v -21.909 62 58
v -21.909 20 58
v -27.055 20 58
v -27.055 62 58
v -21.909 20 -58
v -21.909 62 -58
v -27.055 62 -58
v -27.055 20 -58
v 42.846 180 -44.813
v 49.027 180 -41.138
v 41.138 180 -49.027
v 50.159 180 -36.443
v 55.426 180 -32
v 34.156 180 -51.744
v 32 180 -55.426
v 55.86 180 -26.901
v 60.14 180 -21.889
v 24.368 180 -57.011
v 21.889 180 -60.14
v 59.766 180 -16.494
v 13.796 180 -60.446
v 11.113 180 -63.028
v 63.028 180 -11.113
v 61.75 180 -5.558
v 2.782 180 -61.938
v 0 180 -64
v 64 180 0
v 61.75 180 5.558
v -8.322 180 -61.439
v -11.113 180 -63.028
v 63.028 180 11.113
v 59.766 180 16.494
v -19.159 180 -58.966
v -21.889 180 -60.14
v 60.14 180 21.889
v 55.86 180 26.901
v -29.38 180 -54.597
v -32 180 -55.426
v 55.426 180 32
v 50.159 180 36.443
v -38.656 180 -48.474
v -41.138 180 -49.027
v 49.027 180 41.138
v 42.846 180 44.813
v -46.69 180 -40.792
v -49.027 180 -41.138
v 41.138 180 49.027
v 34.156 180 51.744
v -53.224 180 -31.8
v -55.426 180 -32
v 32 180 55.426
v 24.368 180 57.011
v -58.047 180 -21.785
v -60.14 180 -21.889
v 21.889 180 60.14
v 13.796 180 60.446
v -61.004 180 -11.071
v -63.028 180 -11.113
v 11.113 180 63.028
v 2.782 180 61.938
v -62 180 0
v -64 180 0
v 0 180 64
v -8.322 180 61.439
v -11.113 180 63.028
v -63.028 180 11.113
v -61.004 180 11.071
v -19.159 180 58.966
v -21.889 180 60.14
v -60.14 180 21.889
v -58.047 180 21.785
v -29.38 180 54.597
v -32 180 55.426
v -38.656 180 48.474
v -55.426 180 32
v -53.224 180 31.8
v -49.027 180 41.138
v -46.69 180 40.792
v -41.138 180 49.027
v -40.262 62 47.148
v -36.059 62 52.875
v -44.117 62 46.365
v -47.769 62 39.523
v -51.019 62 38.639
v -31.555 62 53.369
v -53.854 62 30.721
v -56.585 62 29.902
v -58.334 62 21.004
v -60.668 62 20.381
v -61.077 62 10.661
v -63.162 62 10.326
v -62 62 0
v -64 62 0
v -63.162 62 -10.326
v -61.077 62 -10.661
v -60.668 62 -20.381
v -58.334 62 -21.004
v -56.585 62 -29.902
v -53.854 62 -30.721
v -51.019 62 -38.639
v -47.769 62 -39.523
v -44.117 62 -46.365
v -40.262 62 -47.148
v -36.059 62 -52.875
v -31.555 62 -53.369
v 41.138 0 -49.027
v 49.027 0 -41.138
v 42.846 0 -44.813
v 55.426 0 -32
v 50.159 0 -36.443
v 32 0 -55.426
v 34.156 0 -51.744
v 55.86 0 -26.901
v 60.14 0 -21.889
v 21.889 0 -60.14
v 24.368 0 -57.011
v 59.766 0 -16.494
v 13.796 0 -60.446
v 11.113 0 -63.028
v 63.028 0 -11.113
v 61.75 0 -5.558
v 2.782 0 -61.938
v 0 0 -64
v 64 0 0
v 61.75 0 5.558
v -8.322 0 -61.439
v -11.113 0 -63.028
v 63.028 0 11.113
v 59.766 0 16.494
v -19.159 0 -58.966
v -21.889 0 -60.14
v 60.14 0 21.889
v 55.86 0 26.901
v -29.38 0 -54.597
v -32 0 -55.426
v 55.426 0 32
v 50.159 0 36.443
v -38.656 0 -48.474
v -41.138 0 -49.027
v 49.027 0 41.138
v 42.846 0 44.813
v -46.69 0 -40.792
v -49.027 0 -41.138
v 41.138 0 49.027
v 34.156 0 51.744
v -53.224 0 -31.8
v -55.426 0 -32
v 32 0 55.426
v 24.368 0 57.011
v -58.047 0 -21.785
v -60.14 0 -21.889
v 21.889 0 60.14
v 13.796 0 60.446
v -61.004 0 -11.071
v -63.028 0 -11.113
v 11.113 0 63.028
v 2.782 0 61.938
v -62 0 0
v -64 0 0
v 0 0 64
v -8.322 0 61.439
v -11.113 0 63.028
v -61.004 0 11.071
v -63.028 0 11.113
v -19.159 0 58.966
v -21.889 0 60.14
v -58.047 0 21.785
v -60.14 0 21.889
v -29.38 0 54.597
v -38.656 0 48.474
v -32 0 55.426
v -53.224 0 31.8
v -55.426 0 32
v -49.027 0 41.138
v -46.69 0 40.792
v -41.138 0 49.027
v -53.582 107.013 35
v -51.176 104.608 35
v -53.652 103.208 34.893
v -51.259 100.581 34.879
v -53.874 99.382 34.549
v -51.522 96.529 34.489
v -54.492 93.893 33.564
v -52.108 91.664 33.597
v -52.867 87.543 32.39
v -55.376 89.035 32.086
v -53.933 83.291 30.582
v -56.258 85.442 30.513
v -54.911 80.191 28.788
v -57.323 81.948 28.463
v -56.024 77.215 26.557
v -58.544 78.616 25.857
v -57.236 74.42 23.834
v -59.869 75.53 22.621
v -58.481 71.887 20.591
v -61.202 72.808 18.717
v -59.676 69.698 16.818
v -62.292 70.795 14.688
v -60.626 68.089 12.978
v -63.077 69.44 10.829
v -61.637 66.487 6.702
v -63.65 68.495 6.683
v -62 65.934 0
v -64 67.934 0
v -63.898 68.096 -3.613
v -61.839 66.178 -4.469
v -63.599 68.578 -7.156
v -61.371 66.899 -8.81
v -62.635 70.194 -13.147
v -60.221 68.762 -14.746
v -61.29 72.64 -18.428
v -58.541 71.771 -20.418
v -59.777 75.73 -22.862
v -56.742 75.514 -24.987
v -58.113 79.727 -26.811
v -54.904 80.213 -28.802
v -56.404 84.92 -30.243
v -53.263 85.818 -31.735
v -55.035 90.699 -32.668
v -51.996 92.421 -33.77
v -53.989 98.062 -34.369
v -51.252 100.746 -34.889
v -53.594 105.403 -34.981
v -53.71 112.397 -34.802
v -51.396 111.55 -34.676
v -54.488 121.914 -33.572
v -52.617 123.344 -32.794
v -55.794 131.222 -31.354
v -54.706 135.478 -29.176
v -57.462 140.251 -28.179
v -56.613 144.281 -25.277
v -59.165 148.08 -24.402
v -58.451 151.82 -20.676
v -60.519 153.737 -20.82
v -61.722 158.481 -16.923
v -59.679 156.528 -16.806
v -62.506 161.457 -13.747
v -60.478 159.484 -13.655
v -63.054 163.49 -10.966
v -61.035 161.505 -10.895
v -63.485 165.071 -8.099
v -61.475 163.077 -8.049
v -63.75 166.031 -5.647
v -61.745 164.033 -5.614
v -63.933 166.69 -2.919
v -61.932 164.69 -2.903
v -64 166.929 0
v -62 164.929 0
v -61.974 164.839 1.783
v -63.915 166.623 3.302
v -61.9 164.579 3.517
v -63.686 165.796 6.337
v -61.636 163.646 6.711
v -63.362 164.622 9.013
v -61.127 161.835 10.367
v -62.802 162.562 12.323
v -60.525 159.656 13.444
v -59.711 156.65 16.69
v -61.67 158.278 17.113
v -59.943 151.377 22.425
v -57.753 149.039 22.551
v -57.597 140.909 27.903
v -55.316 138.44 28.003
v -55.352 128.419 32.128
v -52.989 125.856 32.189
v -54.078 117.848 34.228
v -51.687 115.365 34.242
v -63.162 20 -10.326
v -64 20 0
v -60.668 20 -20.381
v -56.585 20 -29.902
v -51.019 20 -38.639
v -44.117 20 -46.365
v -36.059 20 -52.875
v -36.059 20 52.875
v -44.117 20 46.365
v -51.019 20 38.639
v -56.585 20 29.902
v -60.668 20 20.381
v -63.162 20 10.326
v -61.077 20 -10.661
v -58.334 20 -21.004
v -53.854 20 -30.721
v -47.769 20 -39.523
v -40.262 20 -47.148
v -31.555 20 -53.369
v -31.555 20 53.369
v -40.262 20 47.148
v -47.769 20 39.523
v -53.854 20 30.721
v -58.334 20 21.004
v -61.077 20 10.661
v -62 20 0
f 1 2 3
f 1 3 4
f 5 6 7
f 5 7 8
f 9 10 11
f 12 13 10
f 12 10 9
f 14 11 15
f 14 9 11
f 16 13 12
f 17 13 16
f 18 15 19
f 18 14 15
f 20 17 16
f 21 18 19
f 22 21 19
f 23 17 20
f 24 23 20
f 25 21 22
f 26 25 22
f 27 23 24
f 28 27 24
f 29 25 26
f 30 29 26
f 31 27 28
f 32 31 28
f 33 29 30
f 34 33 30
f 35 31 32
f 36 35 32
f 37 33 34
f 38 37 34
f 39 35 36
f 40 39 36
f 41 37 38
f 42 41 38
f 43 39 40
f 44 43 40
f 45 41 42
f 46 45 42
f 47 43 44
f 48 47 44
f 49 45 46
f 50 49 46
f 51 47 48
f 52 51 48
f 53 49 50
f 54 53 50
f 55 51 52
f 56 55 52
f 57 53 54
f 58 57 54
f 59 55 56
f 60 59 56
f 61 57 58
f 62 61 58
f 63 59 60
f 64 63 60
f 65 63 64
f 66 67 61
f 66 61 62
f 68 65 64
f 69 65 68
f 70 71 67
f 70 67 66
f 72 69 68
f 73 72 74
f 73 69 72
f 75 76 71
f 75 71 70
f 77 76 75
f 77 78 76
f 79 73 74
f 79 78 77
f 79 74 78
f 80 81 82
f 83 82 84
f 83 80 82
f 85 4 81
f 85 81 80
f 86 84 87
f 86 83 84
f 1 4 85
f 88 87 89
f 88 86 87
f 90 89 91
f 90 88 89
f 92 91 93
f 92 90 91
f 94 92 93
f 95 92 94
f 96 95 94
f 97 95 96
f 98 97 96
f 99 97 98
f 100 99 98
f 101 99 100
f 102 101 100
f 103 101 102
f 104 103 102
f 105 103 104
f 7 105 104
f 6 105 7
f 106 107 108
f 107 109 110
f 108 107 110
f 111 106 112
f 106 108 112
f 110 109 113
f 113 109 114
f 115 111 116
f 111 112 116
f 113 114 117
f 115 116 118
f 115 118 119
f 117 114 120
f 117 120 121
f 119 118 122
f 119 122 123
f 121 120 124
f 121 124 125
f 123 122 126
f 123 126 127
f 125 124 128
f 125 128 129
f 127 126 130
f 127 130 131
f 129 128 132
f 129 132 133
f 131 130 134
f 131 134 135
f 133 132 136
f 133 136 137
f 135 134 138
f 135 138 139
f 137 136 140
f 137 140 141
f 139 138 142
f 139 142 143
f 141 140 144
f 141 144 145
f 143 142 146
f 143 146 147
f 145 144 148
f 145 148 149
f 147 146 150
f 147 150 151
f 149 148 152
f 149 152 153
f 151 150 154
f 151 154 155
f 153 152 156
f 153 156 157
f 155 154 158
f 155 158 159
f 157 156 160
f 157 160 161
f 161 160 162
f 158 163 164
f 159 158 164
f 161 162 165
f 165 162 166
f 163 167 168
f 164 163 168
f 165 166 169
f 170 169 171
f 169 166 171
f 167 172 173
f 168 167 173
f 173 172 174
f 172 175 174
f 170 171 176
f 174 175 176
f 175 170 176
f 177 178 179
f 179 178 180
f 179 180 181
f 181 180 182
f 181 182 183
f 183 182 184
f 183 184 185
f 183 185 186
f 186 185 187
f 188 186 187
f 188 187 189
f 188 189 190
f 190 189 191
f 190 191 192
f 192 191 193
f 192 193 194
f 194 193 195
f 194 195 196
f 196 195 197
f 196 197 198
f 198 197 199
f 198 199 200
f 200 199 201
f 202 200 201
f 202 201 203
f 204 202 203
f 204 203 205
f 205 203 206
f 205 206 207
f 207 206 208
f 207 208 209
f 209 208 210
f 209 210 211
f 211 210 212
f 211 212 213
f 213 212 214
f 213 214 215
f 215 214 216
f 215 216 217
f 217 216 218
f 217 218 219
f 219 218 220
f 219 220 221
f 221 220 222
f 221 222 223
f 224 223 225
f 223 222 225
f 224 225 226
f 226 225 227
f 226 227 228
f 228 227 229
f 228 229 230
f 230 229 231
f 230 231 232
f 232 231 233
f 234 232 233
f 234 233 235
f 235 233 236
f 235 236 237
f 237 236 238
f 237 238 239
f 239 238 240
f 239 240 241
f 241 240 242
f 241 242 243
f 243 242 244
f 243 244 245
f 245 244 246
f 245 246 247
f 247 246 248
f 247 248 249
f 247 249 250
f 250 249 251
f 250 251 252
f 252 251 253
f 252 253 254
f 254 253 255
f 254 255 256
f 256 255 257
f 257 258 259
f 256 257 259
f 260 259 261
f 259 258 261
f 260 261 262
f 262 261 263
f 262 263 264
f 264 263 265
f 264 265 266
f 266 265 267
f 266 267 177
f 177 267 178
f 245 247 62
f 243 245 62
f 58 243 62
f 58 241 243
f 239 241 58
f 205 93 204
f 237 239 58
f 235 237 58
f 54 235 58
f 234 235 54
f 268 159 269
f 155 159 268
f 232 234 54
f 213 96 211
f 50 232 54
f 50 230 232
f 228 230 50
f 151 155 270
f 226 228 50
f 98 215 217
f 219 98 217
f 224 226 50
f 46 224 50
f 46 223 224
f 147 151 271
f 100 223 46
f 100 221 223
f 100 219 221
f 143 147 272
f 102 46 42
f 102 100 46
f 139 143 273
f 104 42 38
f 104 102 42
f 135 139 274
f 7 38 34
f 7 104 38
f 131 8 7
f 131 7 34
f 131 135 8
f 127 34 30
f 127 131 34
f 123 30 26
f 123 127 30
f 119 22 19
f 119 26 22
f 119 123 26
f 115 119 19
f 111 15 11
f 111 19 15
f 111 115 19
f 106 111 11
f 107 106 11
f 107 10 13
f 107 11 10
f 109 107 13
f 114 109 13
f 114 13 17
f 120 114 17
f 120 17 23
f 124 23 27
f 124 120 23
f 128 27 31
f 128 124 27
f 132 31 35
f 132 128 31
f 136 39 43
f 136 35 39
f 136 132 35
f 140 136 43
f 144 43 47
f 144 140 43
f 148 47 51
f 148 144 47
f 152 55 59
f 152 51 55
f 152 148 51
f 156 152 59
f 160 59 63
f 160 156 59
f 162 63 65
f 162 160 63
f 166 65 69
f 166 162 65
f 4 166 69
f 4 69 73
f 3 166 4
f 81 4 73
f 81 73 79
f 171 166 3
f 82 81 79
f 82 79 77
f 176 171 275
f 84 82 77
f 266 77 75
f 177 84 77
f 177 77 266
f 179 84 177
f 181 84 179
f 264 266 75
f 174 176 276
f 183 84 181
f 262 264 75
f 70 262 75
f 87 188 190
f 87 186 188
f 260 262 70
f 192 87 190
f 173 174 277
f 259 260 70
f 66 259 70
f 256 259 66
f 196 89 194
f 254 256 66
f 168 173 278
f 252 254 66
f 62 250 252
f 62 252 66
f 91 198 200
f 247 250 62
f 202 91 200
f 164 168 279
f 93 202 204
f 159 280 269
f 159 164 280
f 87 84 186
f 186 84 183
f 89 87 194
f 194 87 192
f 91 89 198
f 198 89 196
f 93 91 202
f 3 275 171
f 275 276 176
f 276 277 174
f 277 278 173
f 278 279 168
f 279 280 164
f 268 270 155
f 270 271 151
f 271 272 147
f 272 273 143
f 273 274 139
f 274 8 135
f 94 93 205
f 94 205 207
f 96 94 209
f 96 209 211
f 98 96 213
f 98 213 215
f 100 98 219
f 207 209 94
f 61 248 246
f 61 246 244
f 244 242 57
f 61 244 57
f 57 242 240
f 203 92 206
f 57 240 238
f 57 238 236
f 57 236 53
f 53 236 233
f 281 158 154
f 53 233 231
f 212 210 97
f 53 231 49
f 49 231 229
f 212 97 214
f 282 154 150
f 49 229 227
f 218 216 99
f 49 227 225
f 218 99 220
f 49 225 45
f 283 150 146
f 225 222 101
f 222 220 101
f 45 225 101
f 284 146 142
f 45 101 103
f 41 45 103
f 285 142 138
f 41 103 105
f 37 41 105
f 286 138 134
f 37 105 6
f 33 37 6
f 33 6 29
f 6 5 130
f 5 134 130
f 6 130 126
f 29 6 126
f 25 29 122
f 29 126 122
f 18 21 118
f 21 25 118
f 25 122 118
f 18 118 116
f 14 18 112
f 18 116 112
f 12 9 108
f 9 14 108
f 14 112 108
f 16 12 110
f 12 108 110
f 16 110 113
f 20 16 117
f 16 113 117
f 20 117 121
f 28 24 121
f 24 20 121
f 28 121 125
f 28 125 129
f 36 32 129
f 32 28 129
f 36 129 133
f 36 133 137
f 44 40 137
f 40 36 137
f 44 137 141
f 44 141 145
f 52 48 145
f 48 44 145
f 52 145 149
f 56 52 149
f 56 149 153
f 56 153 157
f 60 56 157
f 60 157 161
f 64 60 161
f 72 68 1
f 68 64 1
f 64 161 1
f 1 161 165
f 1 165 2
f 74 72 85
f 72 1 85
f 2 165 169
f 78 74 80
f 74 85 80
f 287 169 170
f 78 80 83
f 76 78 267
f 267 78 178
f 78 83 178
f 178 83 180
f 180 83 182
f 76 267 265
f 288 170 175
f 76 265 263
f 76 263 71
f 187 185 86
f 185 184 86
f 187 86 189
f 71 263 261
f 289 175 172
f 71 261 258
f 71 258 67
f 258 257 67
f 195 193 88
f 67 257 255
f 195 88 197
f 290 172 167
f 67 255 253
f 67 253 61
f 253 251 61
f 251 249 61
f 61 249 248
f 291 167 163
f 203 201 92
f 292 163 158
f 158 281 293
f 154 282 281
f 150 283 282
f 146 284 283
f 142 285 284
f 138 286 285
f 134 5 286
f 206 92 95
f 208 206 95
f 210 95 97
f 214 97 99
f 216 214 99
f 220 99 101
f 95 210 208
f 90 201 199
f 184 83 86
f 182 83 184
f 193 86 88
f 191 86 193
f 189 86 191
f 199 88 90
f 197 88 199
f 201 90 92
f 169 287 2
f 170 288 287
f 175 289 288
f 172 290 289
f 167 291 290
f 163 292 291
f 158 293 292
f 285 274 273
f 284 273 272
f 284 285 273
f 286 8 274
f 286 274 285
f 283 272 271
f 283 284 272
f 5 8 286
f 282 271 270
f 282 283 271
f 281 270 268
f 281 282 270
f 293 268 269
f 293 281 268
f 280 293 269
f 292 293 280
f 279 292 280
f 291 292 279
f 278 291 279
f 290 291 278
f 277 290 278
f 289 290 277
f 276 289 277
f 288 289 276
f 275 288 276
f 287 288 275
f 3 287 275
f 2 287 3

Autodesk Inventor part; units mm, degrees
ref_plane "XZ Plane" through (0, 0, 0) normal (0, 1, 0) x (-1, 0, 0)
ref_plane "XY Plane" through (0, 0, 0) normal (0, 0, 1) x (1, 0, 0)
sketch "Sketch1" plane through (0, 0, 0) normal (0, 1, 0) x (-1, 0, 0)
  circle A0 centre (0, 0) radius 62
  circle A1 centre (0, 0) radius 64
  dimension "d0" = 2
  dimension "d1" = 128
extrude "Extrusion1" add sketch "Sketch1" along normal blind 180
sketch "Sketch2" plane through (0, 0, 0) normal (1, 0, 0) x (0, 1, 0)
  line L0 (20, 58) -> (62, 58)
  line L1 (62, 58) -> (62, -58)
  line L2 (62, -58) -> (20, -58)
  line L3 (20, -58) -> (20, 58)
  line L4 (0, -64) -> (0, 64) projected
  point P0 (0, 0)
  point P1 (0, 0)
  point P2 (41, 58)
  dimension "d4" = 42
  dimension "d5" = 116
  dimension "d6" = 20
  dimension "d7" = 58
extrude "Extrusion2" cut sketch "Sketch2" against normal through all
sketch "Sketch3" plane through (0, 0, 0) normal (1, 0, 0) x (0, 1, 0)
  line L0 (110, -32.8663) -> (110, 39.5028)
  line L1 (0, -64) -> (0, 64) projected
  point P0 (0, 0)
  point P1 (110, 3.3182)
  dimension "d10" = 110
ref_plane "Work Plane1" through (0, 110, -32.8663) normal (-0.7071, 0.7071, 0) x (0, 0, 1)
sketch "Sketch4" plane through (0, 110, -32.8663) normal (-0.7071, 0.7071, 0) x (0, 0, 1)
  circle A0 centre (32.8663, -40) radius 35
  line L0 (0, 0) -> (72.3691, 0) construction
  point P0 (32.8663, -77.7817)
  point P1 (36.1845, 0)
  dimension "d12" = 70
  dimension "d15" = 40
extrude "Extrusion3" cut sketch "Sketch4" along normal through all
properties part number "Insulation Shaft"
